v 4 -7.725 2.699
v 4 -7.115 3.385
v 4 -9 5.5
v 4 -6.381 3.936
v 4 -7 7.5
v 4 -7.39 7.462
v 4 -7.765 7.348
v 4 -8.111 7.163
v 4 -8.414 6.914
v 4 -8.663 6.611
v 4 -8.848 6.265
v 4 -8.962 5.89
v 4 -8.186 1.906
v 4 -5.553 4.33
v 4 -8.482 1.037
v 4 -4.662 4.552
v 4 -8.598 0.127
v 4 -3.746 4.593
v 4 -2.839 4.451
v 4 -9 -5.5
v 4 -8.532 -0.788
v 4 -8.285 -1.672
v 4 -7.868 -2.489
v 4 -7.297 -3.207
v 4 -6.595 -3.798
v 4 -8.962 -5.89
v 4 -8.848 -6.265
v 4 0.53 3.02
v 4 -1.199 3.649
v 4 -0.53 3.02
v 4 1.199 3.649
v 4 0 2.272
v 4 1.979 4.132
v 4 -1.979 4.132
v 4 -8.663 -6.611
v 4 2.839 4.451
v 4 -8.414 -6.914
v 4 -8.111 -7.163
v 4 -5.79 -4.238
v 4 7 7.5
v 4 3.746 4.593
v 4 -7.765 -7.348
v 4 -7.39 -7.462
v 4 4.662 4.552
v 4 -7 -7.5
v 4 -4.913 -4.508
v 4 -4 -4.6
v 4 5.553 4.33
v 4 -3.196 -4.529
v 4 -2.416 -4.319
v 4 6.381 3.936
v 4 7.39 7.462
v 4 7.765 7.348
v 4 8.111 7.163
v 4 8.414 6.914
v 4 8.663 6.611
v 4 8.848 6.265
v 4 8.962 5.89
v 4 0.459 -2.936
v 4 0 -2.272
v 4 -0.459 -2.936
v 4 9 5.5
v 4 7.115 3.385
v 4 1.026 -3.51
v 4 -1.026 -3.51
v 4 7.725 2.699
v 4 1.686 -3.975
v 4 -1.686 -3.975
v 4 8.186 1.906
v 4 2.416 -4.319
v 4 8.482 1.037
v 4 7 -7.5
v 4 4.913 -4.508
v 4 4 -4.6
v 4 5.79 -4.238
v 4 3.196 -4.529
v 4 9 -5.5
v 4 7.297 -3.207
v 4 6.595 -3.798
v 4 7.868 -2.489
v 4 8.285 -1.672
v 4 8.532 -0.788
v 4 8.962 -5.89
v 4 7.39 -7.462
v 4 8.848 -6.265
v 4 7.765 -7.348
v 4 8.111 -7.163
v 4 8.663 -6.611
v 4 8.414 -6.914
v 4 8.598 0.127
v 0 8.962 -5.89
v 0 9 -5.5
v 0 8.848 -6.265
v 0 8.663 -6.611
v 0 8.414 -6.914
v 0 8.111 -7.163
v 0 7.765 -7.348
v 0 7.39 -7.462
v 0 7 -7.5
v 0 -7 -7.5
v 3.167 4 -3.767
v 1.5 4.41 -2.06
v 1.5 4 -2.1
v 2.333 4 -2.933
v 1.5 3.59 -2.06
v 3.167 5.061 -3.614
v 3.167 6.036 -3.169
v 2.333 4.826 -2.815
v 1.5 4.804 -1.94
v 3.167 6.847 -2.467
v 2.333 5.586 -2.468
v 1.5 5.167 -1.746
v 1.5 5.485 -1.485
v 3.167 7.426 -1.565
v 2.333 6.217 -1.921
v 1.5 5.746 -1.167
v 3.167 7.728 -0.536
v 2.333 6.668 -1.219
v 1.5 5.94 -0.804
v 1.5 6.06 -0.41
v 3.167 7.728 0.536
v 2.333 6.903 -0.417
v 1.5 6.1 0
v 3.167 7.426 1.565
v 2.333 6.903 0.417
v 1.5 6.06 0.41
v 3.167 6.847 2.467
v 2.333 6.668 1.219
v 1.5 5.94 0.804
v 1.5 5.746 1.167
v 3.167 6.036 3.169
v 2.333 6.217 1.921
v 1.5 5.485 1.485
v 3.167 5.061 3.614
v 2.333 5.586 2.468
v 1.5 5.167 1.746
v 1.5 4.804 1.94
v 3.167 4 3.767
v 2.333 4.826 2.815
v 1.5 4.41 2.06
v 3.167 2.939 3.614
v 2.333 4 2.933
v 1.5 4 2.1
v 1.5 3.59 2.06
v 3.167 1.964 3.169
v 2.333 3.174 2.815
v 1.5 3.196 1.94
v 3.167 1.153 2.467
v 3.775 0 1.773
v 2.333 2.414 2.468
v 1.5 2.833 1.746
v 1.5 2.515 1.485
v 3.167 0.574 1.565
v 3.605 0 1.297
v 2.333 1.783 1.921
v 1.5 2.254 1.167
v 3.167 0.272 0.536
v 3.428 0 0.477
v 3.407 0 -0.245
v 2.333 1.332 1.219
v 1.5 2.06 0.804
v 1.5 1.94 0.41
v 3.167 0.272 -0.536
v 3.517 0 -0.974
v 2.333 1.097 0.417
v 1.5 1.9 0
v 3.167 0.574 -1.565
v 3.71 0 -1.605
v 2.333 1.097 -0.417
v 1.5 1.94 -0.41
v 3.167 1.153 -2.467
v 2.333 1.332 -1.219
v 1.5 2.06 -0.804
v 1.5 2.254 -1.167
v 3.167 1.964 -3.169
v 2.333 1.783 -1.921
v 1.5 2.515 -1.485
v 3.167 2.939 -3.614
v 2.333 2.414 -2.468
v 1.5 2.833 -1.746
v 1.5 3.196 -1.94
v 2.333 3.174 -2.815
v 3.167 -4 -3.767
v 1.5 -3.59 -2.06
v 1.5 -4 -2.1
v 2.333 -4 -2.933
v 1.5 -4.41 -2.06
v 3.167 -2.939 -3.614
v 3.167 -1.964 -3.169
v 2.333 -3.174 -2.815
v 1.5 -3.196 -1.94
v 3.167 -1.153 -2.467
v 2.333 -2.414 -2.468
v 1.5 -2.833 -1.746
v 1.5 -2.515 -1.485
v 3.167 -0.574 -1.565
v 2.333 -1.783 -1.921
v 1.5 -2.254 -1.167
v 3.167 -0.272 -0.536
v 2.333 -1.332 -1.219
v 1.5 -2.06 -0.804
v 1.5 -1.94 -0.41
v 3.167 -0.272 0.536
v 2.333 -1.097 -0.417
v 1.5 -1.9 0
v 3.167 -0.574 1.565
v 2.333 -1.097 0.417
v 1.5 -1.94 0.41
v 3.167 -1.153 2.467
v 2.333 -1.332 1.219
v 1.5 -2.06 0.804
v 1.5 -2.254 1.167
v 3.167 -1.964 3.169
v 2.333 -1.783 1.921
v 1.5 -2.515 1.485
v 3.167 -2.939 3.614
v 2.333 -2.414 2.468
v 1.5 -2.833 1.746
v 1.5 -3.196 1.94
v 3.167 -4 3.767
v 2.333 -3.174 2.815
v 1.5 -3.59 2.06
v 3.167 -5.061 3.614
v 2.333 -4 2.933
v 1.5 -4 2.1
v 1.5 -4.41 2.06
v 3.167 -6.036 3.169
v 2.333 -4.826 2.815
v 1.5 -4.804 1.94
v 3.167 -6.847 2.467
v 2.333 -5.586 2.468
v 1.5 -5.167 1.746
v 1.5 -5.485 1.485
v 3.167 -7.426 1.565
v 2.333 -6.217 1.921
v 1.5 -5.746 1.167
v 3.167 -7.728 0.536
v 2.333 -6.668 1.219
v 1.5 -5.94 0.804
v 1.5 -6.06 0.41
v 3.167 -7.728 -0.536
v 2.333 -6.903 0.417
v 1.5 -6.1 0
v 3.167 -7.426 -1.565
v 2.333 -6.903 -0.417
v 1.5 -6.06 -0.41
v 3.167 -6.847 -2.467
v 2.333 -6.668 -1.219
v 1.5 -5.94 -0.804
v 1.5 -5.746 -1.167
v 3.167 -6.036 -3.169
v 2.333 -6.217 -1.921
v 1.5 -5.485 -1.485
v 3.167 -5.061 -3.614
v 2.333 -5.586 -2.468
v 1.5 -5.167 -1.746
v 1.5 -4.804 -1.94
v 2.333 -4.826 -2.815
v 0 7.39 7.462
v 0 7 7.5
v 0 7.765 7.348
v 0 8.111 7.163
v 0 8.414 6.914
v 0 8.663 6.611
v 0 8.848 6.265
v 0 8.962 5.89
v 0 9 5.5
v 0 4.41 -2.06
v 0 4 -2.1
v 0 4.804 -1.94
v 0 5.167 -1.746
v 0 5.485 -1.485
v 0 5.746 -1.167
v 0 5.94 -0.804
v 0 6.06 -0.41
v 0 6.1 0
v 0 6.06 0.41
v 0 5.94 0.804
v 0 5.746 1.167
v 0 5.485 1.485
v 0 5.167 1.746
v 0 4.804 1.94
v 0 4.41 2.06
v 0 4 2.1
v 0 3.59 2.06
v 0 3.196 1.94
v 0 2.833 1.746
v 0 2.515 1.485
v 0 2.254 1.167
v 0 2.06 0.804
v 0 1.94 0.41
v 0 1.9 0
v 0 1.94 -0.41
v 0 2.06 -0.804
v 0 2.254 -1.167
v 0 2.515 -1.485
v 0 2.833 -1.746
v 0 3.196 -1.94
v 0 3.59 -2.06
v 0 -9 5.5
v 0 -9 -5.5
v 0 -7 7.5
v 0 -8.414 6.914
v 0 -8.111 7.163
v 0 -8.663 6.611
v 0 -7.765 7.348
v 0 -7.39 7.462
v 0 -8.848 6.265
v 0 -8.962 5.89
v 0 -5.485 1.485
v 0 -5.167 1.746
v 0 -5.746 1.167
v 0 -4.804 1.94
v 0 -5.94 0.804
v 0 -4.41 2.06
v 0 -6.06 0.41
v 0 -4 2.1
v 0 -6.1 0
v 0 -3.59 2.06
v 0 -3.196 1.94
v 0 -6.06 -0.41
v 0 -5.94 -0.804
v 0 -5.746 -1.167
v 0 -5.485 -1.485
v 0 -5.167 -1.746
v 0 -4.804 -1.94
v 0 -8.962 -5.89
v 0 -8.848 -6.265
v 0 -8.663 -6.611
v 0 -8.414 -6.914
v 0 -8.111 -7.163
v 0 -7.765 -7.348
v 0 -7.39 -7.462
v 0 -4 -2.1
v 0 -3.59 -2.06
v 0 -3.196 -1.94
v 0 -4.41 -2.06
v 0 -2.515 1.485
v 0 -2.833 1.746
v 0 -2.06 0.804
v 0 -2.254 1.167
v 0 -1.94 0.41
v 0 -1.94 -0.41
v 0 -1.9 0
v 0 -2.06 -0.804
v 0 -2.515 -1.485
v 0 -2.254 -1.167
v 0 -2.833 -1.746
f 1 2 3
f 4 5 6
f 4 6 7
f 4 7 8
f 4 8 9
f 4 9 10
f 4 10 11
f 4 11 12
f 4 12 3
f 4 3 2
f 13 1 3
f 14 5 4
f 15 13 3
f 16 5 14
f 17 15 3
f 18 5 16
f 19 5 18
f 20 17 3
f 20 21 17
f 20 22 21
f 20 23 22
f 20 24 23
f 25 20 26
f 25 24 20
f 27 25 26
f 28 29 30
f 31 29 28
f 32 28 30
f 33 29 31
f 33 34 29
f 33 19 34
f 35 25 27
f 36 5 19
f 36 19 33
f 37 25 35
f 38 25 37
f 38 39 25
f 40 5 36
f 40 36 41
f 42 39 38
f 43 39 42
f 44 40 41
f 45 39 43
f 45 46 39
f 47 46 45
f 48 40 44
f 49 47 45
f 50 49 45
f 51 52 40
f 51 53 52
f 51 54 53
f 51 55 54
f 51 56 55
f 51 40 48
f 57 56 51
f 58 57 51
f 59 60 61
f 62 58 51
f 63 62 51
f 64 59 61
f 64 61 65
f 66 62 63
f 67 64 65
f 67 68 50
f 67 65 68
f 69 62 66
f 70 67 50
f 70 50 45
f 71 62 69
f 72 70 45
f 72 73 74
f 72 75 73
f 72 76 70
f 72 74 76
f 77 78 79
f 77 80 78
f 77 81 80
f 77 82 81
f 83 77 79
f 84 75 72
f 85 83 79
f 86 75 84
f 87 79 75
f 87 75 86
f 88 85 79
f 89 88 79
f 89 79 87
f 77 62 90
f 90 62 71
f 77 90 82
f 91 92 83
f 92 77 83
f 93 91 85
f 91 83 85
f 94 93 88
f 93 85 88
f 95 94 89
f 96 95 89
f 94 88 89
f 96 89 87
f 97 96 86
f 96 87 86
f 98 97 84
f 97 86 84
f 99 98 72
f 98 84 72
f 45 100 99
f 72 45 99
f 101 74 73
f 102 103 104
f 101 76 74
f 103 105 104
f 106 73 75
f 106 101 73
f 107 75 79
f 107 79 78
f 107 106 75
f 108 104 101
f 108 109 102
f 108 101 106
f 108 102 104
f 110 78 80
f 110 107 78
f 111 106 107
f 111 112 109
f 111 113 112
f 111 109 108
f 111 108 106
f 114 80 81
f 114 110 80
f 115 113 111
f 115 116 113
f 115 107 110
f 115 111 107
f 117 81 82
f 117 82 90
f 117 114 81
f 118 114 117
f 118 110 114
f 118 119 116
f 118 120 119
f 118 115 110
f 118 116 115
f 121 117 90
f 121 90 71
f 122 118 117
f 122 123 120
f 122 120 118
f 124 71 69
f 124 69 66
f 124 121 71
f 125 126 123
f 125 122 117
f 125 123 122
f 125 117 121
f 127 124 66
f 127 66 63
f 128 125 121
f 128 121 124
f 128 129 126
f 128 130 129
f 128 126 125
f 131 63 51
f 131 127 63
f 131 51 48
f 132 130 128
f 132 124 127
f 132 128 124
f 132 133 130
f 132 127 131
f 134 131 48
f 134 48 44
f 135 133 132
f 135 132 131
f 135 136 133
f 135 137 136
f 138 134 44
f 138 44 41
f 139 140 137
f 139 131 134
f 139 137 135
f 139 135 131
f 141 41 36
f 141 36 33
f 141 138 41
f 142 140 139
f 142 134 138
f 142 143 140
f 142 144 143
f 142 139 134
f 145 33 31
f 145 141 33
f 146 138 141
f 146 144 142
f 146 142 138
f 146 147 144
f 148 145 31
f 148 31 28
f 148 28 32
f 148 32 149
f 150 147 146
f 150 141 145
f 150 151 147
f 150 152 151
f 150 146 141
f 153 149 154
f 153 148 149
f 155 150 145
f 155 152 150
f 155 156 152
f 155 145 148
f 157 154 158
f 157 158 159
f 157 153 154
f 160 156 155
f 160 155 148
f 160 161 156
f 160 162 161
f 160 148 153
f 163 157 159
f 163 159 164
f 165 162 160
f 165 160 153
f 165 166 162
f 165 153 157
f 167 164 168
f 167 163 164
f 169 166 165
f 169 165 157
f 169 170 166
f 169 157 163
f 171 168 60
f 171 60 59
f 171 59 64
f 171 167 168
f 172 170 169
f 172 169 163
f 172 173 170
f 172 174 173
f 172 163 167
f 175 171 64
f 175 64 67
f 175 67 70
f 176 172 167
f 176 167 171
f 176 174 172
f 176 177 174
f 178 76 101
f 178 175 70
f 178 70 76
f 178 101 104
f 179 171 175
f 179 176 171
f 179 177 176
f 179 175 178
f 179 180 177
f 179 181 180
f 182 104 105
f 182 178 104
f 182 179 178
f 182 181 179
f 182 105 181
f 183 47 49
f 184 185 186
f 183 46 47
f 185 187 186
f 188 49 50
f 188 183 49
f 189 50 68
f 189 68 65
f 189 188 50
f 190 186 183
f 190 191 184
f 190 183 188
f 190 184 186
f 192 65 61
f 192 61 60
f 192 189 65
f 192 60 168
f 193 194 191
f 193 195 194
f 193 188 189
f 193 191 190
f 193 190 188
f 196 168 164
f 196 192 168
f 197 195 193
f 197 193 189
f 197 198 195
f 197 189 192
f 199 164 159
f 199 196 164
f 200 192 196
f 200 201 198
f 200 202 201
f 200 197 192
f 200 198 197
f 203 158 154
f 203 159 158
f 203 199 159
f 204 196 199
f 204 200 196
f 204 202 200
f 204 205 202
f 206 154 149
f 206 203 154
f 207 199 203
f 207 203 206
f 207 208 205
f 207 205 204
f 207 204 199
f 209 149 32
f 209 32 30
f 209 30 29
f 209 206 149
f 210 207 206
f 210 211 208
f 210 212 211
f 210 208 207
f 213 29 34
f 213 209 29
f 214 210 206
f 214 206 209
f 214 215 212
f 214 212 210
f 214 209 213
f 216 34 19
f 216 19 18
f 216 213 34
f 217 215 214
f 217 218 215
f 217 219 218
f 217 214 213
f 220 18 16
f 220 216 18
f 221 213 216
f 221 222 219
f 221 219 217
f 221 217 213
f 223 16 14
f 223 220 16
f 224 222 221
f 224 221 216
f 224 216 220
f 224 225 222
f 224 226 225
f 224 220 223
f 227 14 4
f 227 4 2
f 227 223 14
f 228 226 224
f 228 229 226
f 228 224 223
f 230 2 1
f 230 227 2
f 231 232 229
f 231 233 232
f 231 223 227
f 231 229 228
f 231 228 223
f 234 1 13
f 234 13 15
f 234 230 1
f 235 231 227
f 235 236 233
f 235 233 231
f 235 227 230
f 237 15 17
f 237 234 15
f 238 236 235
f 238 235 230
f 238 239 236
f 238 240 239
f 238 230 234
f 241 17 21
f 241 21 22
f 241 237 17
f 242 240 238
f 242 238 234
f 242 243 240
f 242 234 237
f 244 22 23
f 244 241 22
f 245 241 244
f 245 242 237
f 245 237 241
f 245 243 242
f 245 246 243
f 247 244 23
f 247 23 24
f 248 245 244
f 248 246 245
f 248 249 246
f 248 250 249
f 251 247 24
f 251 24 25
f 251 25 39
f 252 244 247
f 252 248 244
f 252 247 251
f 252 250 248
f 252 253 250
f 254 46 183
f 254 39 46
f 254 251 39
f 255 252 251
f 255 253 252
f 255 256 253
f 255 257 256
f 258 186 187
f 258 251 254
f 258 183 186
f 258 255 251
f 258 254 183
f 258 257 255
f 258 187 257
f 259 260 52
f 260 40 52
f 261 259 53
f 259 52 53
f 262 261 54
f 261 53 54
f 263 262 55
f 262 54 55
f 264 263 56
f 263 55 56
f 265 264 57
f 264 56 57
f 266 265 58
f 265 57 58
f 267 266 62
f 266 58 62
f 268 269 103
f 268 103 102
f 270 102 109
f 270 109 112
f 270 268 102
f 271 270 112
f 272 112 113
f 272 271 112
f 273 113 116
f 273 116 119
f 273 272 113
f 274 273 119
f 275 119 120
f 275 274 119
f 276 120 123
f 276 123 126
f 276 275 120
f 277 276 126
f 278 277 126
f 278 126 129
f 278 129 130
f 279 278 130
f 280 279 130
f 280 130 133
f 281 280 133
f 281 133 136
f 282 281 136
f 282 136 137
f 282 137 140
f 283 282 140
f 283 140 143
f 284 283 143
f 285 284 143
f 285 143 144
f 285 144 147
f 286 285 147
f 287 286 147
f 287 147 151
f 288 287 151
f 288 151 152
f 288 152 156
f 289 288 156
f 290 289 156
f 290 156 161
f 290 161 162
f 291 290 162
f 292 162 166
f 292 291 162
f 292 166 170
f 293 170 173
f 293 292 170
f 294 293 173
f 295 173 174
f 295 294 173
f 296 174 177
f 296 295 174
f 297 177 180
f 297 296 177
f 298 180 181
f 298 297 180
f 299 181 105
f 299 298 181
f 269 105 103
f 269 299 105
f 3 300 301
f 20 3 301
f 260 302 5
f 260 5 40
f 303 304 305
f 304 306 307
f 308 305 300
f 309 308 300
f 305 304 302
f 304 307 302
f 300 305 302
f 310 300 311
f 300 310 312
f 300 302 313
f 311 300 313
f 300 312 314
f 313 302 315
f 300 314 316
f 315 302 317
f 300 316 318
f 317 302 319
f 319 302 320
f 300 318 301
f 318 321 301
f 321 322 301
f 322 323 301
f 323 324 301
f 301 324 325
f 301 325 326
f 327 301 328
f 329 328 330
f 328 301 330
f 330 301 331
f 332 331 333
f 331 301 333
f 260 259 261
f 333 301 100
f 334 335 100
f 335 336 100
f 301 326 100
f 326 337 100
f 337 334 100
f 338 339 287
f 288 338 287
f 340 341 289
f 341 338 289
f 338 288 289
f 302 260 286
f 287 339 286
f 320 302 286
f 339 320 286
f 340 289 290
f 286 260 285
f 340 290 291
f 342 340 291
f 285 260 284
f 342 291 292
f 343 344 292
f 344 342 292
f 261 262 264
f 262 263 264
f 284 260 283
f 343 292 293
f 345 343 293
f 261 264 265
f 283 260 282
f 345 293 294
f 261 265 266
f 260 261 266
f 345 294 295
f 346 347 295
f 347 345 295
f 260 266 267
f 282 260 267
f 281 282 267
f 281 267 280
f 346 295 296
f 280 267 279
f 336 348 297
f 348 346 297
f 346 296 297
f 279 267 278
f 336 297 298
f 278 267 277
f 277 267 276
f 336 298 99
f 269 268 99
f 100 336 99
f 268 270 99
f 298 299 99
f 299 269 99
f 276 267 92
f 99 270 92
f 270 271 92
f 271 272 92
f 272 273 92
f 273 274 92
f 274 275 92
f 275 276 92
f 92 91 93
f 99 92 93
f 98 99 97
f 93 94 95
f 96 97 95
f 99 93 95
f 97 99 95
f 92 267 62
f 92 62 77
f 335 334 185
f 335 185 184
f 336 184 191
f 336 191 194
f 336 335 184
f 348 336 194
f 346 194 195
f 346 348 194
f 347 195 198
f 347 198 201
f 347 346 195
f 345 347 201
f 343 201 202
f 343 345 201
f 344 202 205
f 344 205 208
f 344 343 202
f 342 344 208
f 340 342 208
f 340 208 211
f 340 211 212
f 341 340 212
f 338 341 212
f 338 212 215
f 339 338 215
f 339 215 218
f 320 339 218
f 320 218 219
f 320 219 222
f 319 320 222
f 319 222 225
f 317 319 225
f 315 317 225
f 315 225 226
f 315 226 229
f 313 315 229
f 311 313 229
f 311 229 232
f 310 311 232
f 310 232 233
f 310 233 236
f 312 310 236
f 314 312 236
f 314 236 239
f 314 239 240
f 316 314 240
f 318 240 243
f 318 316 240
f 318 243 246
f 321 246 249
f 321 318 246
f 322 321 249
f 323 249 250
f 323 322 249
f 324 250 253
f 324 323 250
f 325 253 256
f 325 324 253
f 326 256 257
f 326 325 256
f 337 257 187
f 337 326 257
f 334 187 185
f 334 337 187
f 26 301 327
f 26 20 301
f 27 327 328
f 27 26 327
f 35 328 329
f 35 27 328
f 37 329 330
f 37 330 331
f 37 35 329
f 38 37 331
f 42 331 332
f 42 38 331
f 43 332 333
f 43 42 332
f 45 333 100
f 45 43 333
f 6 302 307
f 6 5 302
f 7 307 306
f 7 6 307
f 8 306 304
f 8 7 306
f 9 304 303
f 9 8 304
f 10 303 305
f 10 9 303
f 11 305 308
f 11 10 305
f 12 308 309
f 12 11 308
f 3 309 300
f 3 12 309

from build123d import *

# Parameters (mm, degrees)
SKETCH4_W           = 15
SKETCH4_H           = 18
SKETCH4_R           = 2.1
BOSS_EXTRUDE1_DEPTH = 4
FILLET1_R           = 2
CHAMFER1_SIZE       = 2.5


with BuildPart() as part:
    # Sketch4 → Boss-Extrude1 (new body)
    with BuildSketch(Plane(origin=(0, 0, 0), x_dir=(0, 0, -1), z_dir=(1, 0, 0))):
        Rectangle(SKETCH4_W, SKETCH4_H)
        with Locations((0, 4)):
            Circle(SKETCH4_R, mode=Mode.SUBTRACT)
        with Locations((0, -4)):
            Circle(SKETCH4_R, mode=Mode.SUBTRACT)
    extrude(amount=BOSS_EXTRUDE1_DEPTH)

    # Fillet1
    fillet1_edges = [part.edges().sort_by_distance(p)[0] for p in [
        (2, -9, -7.5),
        (2, -9, 7.5),
        (2, 9, 7.5),
        (2, 9, -7.5),
    ]]
    fillet(fillet1_edges, radius=FILLET1_R)

    # Chamfer1
    # the kernel refuses this chamfer: 2.5 mm, written as the material it takes off along each edge
    with BuildSketch(Plane(origin=(4, 4, 0), x_dir=(0, 0, -1), z_dir=(0, -1, 0))) as chamfer1_piece_1:
        Polygon((2.1 + CHAMFER1_SIZE, 0), (2.1, -CHAMFER1_SIZE), (2.1, 0), align=None)
    revolve(axis=Axis((4, 4, 0), (1, 0, 0)), mode=Mode.SUBTRACT)
    with BuildSketch(Plane(origin=(4, -4, 0), x_dir=(0, 0, -1), z_dir=(0, -1, 0))) as chamfer1_piece_2:
        Polygon((2.1 + CHAMFER1_SIZE, 0), (2.1, -CHAMFER1_SIZE), (2.1, 0), align=None)
    revolve(axis=Axis((4, -4, 0), (1, 0, 0)), mode=Mode.SUBTRACT)


solid = part.part
